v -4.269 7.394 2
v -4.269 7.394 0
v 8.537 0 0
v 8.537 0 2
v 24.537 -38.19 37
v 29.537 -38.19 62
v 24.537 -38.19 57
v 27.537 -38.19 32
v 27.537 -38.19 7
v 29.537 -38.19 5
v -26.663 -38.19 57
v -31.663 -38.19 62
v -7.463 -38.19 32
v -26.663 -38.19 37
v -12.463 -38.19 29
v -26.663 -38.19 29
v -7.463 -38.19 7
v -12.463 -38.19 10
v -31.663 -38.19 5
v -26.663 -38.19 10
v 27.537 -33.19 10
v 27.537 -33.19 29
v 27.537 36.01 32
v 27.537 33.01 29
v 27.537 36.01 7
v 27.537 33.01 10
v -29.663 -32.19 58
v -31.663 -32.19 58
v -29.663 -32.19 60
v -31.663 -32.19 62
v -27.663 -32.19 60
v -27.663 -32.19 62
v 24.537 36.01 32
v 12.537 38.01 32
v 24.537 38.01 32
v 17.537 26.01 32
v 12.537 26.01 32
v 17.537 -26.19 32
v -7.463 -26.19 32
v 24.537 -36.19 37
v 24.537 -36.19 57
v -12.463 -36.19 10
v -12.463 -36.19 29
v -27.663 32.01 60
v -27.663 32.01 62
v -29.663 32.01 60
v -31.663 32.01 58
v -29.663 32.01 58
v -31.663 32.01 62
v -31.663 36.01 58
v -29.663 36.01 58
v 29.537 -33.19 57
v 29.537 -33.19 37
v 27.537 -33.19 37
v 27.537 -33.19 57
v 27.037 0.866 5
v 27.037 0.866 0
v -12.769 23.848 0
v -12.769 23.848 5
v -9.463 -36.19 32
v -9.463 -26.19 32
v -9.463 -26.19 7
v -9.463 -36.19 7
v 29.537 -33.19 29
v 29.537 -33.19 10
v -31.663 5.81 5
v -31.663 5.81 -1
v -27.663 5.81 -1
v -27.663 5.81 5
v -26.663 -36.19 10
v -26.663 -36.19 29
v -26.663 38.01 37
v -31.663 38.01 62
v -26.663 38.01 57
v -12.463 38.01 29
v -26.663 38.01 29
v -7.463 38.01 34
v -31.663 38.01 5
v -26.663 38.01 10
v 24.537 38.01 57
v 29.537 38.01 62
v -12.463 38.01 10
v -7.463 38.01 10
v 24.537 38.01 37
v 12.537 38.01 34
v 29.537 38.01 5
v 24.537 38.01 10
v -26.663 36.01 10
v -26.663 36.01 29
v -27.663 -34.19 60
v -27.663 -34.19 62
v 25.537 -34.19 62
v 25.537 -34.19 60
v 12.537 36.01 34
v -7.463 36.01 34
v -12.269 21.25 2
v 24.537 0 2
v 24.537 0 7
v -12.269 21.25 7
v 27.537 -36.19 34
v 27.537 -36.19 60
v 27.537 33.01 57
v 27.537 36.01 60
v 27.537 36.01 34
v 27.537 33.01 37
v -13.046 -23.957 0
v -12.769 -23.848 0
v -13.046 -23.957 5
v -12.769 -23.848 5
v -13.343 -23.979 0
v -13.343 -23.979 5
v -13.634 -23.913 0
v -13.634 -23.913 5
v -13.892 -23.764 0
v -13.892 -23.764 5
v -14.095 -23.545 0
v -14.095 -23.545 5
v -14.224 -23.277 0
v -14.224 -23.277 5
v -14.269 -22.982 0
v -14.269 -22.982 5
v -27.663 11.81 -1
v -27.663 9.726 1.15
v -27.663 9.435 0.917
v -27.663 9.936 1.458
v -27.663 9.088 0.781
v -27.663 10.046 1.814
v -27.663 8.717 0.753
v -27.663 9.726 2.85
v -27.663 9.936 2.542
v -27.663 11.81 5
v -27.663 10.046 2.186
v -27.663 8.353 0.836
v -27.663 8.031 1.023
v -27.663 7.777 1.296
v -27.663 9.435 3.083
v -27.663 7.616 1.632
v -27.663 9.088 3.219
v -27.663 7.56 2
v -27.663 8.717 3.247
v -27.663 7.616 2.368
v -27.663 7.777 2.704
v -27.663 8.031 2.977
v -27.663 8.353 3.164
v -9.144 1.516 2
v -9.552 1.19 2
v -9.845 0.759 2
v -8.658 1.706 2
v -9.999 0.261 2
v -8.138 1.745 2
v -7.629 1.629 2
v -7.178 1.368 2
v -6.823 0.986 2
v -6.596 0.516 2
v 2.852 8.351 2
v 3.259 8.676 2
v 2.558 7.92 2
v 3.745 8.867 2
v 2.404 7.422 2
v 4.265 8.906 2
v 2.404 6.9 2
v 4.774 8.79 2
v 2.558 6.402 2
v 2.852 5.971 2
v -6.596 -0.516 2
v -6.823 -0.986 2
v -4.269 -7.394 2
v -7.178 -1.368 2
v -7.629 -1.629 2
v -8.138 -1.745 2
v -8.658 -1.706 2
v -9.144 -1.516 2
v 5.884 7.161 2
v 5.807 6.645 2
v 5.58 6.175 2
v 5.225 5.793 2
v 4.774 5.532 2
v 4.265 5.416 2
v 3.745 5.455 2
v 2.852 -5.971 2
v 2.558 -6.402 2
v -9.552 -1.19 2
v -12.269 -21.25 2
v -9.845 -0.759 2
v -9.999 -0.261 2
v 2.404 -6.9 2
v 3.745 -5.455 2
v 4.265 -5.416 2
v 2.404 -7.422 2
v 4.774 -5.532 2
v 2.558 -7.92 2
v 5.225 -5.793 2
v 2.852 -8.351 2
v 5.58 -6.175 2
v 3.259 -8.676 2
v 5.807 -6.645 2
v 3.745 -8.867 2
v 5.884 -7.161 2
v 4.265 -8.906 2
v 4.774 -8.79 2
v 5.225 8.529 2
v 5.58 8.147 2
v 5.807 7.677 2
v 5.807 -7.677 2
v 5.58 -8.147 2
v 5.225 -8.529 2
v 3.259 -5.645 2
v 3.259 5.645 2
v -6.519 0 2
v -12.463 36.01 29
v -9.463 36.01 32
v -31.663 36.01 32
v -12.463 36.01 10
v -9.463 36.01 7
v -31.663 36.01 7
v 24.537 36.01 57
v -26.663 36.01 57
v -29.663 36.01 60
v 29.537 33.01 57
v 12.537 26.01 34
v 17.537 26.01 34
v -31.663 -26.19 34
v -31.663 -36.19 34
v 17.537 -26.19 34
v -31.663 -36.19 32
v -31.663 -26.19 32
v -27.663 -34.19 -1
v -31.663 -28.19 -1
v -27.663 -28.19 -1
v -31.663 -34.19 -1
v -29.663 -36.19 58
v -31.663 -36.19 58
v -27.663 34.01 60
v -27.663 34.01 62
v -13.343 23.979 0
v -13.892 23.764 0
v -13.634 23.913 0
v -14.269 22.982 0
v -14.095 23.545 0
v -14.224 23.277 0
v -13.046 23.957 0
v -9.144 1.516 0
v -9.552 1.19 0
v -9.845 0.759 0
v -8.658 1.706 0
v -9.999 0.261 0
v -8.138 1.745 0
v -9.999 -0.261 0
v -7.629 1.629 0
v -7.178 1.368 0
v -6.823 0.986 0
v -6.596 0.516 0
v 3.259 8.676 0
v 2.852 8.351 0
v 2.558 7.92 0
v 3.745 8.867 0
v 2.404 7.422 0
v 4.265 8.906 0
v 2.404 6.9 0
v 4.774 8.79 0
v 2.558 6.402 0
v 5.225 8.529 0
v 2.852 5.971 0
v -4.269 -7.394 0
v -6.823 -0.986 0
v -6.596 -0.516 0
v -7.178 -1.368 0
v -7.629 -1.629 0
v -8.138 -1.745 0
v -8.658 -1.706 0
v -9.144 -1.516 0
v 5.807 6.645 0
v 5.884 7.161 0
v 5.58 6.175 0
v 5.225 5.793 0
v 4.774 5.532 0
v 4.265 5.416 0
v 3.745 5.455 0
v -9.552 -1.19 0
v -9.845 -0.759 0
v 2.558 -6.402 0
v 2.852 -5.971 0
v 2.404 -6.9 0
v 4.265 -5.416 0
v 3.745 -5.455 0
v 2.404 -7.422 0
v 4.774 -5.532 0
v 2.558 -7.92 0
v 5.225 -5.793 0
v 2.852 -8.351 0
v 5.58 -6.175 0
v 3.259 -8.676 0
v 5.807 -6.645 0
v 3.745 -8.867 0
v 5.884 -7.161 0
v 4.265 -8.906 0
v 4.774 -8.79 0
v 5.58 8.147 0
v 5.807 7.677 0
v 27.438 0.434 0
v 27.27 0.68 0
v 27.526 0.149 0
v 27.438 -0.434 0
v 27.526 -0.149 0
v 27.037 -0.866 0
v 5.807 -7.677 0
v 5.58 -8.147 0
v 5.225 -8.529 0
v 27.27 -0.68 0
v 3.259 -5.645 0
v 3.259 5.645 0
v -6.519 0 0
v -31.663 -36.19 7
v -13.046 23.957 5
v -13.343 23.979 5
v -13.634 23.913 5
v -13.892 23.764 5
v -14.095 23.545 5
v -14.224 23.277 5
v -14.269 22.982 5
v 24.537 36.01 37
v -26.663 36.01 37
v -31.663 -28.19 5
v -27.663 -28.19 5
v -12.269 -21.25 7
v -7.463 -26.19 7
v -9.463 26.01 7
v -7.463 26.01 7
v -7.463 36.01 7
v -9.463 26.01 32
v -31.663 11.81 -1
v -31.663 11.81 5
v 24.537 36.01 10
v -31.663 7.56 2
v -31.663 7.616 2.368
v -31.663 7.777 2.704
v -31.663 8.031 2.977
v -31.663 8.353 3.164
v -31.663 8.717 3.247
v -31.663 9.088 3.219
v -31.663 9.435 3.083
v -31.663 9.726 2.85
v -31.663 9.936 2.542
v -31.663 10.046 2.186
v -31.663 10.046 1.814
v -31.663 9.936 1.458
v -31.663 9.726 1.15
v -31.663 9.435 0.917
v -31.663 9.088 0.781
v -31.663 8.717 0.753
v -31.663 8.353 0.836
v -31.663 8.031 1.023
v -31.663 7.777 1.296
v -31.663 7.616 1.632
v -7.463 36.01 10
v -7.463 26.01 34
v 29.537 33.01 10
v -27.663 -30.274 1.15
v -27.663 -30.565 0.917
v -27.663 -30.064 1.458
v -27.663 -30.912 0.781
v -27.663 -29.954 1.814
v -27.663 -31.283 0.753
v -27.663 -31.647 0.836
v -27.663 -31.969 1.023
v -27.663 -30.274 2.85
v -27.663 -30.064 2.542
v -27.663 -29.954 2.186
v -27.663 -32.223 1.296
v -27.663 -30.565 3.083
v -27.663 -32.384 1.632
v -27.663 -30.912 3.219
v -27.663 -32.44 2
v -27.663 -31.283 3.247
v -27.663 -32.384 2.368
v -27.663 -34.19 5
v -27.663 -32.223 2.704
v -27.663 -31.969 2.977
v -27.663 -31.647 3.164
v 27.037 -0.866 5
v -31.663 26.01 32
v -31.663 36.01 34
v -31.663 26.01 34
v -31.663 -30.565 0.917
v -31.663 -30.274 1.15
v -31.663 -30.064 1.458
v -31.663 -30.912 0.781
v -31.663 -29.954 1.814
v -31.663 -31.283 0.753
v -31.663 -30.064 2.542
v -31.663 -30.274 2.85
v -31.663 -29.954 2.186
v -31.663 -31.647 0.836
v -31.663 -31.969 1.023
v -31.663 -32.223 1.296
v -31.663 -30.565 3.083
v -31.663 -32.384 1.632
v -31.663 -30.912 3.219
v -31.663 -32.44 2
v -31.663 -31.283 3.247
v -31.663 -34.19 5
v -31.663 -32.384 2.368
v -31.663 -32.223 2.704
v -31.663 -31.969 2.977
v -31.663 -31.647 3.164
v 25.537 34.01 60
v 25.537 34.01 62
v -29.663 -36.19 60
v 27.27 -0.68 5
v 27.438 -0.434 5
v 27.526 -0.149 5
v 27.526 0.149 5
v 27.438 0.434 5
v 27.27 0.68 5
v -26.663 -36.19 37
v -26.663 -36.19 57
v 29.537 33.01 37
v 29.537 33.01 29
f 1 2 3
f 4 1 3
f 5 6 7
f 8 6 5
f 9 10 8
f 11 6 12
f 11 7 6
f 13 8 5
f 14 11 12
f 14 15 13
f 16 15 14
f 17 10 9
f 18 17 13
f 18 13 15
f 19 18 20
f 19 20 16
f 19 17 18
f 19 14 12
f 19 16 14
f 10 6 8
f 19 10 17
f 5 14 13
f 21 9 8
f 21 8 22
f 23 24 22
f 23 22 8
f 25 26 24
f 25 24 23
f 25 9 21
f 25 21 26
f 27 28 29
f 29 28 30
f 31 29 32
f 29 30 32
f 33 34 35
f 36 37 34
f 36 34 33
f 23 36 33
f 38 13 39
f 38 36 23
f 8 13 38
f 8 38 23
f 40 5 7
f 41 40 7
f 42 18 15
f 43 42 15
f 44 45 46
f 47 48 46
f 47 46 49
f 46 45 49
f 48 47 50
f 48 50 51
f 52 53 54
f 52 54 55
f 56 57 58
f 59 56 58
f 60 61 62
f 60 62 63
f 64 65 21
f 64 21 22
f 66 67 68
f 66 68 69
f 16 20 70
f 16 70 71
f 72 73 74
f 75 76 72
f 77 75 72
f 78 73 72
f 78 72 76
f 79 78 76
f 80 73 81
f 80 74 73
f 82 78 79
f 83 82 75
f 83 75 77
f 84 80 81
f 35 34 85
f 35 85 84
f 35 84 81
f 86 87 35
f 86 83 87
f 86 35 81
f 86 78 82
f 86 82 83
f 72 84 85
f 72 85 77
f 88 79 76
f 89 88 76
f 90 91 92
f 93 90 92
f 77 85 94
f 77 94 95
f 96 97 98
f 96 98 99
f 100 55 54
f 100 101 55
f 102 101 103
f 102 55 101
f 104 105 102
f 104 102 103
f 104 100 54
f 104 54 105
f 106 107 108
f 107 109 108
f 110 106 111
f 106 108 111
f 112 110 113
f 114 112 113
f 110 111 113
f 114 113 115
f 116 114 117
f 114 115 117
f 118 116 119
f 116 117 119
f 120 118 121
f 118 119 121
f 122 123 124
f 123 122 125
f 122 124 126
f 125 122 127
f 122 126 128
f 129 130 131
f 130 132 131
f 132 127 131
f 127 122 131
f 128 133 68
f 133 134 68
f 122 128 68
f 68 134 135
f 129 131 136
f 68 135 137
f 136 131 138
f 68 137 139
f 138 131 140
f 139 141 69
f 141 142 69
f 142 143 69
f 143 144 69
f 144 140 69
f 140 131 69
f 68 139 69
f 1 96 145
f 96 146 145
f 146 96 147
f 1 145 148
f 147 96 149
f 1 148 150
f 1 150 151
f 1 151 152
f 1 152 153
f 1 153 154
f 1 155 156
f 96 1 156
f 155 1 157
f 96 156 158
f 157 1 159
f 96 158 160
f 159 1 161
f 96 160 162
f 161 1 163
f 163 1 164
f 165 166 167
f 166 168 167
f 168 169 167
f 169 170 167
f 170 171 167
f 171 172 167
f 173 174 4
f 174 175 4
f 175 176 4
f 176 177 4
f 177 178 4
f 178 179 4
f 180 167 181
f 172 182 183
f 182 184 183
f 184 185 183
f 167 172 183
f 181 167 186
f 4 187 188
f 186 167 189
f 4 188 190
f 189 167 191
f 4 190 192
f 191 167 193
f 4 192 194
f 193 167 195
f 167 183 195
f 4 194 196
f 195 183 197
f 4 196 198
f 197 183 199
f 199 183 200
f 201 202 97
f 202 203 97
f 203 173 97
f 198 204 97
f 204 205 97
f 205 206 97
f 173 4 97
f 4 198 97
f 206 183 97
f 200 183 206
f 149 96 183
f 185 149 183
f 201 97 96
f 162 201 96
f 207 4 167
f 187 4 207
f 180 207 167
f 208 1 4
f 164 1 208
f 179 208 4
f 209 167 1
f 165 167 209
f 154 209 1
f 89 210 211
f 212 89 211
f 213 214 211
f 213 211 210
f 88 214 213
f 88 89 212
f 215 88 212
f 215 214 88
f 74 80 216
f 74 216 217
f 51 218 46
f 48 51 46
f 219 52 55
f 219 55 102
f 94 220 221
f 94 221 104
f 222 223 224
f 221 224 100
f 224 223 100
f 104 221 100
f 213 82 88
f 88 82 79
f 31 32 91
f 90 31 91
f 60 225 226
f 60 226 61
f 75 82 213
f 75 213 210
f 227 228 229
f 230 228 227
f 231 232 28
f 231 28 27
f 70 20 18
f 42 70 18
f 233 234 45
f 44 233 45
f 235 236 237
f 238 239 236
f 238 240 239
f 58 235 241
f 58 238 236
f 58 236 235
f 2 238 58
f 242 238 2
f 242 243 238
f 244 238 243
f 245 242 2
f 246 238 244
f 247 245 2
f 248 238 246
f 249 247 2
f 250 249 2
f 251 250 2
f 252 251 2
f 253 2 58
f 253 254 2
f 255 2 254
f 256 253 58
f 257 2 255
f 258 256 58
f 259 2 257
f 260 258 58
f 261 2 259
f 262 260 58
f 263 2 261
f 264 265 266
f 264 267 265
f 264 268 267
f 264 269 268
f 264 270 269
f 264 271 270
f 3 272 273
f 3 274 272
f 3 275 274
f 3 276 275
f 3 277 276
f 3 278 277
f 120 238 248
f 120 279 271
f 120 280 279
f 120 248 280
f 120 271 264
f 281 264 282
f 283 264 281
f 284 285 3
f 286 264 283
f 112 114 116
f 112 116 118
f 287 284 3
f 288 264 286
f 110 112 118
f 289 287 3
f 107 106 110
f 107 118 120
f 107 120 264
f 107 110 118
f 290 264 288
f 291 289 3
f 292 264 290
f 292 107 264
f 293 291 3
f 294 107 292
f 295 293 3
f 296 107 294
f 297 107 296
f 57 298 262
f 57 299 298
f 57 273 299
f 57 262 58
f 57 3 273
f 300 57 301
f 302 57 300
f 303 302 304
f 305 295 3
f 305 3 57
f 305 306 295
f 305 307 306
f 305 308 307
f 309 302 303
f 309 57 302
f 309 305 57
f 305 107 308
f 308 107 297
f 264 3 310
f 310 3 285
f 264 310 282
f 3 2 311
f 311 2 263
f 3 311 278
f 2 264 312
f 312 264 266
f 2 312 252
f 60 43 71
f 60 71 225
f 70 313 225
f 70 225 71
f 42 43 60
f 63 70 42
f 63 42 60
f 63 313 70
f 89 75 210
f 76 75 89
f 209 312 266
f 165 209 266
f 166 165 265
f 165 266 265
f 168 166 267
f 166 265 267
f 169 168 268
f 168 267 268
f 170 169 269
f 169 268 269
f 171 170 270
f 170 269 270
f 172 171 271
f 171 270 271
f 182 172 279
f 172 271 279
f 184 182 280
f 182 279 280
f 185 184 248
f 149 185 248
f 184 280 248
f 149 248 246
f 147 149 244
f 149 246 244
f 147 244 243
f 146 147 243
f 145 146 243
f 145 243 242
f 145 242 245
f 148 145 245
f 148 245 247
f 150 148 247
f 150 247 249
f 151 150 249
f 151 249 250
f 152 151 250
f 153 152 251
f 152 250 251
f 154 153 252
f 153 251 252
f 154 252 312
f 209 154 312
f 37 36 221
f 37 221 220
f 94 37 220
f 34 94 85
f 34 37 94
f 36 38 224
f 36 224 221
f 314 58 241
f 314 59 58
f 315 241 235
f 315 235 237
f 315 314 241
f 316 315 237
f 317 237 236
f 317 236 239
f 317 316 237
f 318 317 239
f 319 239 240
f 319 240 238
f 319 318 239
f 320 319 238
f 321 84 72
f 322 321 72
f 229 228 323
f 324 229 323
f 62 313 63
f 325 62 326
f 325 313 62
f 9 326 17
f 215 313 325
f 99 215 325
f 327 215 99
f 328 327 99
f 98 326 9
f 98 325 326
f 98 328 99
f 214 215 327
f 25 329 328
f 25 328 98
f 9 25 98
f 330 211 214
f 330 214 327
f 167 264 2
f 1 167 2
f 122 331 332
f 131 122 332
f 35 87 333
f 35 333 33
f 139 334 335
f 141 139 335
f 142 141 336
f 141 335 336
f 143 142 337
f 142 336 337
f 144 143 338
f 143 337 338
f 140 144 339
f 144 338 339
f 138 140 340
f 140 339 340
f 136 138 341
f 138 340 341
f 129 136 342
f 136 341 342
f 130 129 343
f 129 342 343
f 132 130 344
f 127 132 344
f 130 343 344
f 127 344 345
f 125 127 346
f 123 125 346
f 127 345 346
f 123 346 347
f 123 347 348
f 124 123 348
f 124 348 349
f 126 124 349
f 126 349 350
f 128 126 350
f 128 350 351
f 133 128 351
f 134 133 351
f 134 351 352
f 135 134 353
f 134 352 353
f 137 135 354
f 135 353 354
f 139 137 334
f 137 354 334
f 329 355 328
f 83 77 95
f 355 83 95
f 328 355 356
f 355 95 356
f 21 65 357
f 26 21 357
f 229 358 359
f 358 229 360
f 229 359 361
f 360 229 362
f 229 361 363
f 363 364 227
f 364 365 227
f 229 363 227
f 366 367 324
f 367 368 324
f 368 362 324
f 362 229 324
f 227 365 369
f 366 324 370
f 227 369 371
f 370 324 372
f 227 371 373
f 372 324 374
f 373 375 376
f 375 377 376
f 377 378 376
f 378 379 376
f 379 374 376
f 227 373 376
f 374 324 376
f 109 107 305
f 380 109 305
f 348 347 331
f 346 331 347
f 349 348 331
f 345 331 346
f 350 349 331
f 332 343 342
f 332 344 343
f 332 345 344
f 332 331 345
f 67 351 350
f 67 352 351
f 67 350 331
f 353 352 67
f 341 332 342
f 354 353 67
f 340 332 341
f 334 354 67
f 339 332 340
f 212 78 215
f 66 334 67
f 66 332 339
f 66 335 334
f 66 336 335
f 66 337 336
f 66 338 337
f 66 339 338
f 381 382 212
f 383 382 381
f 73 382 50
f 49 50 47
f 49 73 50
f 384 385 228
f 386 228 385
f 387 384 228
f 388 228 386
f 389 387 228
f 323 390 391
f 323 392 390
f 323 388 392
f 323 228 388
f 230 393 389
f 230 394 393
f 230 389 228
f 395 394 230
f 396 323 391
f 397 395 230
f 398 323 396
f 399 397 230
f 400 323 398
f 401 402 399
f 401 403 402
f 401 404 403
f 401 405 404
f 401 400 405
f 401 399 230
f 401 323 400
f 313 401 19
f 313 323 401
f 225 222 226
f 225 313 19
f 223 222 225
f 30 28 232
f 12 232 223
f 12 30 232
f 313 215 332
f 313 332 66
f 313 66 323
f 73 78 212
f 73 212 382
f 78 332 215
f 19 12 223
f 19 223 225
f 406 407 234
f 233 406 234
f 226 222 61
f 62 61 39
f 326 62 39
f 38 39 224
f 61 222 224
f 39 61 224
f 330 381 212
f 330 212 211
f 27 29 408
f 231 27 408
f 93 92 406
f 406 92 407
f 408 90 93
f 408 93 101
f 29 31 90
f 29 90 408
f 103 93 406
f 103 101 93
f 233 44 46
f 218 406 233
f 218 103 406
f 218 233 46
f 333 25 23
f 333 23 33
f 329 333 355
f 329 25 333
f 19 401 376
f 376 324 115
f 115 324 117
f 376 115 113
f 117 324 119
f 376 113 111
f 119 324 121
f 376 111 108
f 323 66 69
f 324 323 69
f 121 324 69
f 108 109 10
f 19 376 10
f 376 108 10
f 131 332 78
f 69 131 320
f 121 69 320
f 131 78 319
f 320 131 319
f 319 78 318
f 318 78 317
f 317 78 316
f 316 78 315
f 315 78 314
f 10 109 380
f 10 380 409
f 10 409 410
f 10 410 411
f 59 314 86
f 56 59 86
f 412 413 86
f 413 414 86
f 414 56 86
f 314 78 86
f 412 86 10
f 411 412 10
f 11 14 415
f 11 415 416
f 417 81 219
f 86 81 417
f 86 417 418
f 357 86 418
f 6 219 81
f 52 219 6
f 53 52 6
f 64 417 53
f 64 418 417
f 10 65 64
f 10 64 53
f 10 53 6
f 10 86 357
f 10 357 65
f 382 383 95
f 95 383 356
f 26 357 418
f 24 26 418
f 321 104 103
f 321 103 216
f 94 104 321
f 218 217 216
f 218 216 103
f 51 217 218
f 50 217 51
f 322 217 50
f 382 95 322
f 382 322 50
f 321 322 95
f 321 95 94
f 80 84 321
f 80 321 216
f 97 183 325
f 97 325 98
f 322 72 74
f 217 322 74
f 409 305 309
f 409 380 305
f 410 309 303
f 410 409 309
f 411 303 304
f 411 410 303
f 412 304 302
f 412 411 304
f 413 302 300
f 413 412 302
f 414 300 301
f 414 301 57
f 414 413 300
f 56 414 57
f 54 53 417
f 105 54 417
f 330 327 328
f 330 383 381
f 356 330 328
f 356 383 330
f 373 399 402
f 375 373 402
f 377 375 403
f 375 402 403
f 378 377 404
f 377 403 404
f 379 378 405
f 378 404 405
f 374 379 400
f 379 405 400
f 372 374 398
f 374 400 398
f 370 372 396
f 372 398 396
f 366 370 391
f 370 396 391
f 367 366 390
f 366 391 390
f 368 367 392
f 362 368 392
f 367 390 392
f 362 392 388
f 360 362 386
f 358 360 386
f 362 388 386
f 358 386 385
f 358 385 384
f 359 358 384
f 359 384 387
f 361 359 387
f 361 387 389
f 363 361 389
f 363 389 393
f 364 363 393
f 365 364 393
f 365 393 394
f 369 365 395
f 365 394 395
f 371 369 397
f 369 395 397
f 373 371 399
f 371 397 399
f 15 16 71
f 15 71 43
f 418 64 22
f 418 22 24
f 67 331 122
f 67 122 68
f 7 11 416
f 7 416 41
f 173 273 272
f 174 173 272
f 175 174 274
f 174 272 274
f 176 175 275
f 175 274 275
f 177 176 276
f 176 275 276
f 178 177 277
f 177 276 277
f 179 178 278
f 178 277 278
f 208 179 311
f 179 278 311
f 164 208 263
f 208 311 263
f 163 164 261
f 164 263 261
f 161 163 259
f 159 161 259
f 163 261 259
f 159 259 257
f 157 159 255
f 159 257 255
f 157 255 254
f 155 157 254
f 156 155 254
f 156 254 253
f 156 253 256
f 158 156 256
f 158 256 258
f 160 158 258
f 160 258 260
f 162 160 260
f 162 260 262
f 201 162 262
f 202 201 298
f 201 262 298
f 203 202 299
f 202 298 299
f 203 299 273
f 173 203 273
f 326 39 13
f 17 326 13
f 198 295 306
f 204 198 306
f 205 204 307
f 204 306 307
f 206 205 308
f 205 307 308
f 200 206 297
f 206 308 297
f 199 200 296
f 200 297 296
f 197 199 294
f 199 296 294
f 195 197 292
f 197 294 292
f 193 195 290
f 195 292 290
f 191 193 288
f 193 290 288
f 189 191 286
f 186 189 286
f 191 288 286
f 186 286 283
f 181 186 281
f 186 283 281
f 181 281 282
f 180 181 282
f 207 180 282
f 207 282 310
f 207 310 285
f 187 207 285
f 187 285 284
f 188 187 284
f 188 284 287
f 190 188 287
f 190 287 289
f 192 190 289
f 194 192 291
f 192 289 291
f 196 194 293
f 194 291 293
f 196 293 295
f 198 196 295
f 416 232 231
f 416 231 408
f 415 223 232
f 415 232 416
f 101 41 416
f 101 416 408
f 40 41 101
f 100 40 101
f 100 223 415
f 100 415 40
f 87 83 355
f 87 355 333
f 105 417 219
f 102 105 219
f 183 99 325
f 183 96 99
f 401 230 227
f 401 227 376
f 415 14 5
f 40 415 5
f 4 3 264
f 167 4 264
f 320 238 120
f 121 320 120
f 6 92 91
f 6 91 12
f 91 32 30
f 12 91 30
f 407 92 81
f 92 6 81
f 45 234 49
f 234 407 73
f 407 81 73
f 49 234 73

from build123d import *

# Parameters (mm, degrees)
PAD_DEPTH       = 5
FILLET_R        = 1
FILLET001_R     = 1
FILLET002_R     = 1
SKETCH001_R     = 1.75
PAD001_DEPTH    = 2
SKETCH002_W     = 61.2
SKETCH002_H     = 76.2
PAD002_DEPTH    = 2
PAD003_DEPTH    = 55
SKETCH004_W     = 35
SKETCH004_H     = 25
SKETCH004_W_2   = 14.2
SKETCH004_H_2   = 19
SKETCH004_W_3   = 51.2
SKETCH004_H_3   = 20
POCKET_DEPTH    = 2
SKETCH005_W     = 14.2
SKETCH005_H     = 19
SKETCH005_W_2   = 51.2
SKETCH005_H_2   = 20
POCKET001_DEPTH = 2
SKETCH006_W     = 66.2
SKETCH006_H     = 19
SKETCH006_H_2   = 20
POCKET002_DEPTH = 2
SKETCH007_W     = 24.2
SKETCH007_H     = 10
PAD004_DEPTH    = 2
SKETCH008_W     = 2
SKETCH008_H     = 10
PAD005_DEPTH    = 25
PAD006_DEPTH    = 2
SKETCH010_W     = 2
SKETCH010_H     = 4
PAD007_DEPTH    = 2
SKETCH011_W     = 6
SKETCH011_H     = 6
SKETCH011_R     = 1.25
PAD008_DEPTH    = 4


with BuildPart() as part:
    # Sketch → Pad (new body)
    with BuildSketch(Plane.XY):
        Polygon((28.537386, 0), (-14.268693, 24.714102), (-14.268693, -24.714102), align=None)
        Polygon((24.537386, 0), (-12.268693, 21.25), (-12.268693, -21.25), align=None, mode=Mode.SUBTRACT)
    extrude(amount=PAD_DEPTH)

    # Fillet
    fillet_edges = [part.edges().sort_by_distance(p)[0] for p in [
        (-14.268693, -24.714102, 2.5),
    ]]
    fillet(fillet_edges, radius=FILLET_R)

    # Fillet001
    fillet001_edges = [part.edges().sort_by_distance(p)[0] for p in [
        (28.537386, 0, 2.5),
    ]]
    fillet(fillet001_edges, radius=FILLET001_R)

    # Fillet002
    fillet002_edges = [part.edges().sort_by_distance(p)[0] for p in [
        (-14.268693, 24.714102, 2.5),
    ]]
    fillet(fillet002_edges, radius=FILLET002_R)

    # Sketch001 (on Face1 of Fillet002) → Pad001 (join)
    with BuildSketch(Plane(origin=(0, 0, 0), x_dir=(1, 0, 0), z_dir=(0, 0, -1))):
        Polygon((24.537386, 0), (-12.268693, 21.25), (-12.268693, -21.25), align=None)
        with Locations((4.134347, 7.160898)):
            Circle(SKETCH001_R, mode=Mode.SUBTRACT)
        with Locations((4.134347, -7.160898)):
            Circle(SKETCH001_R, mode=Mode.SUBTRACT)
        with Locations((-8.268693, 0)):
            Circle(SKETCH001_R, mode=Mode.SUBTRACT)
        Polygon((8.537386, 0), (-4.268693, 7.393594), (-4.268693, -7.393594), align=None, mode=Mode.SUBTRACT)
    extrude(amount=-PAD001_DEPTH)

    # Sketch002 (on Face9 of Pad001) → Pad002 (join)
    with BuildSketch(Plane.XY.offset(5)):
        with Locations((-1.062614, -0.09)):
            Rectangle(SKETCH002_W, SKETCH002_H)
        Polygon((-12.268693, 21.25), (-12.268693, -21.25), (24.537386, 0), align=None, mode=Mode.SUBTRACT)
    extrude(amount=PAD002_DEPTH)

    # Sketch003 (on Face21 of Pad002) → Pad003 (join)
    with BuildSketch(Plane.XY.offset(7)):
        Polygon((-31.662614, 38.01), (29.537386, 38.01), (29.537386, -38.19), (-31.662614, -38.19), (-31.662614, -36.19), (27.537386, -36.19), (27.537386, 36.01), (-31.662614, 36.01), align=None)
    extrude(amount=PAD003_DEPTH)

    # Sketch004 (on Face26 of Pad003) → Pocket (cut)
    with BuildSketch(Plane.XZ.offset(38.19)):
        with Locations((10.037386, 19.5)):
            Rectangle(SKETCH004_W, SKETCH004_H)
        with Locations((-19.562614, 19.5)):
            Rectangle(SKETCH004_W_2, SKETCH004_H_2)
        with Locations((-1.062614, 47)):
            Rectangle(SKETCH004_W_3, SKETCH004_H_3)
    extrude(amount=-POCKET_DEPTH, mode=Mode.SUBTRACT)

    # Sketch005 (on Face21 of Pocket) → Pocket001 (cut)
    with BuildSketch(Plane(origin=(0, 38.01, 0), x_dir=(-1, 0, 0), z_dir=(0, 1, 0))):
        Polygon((-24.537386, 32), (-12.537386, 32), (-12.537386, 34), (7.462614, 34), (7.462614, 32), (7.462614, 10), (-24.537386, 10), align=None)
        with Locations((19.562614, 19.5)):
            Rectangle(SKETCH005_W, SKETCH005_H)
        with Locations((1.062614, 47)):
            Rectangle(SKETCH005_W_2, SKETCH005_H_2)
    extrude(amount=-POCKET001_DEPTH, mode=Mode.SUBTRACT)

    # Sketch006 (on Face25 of Pocket001) → Pocket002 (cut)
    with BuildSketch(Plane.YZ.offset(29.537386)):
        with Locations((-0.09, 19.5)):
            Rectangle(SKETCH006_W, SKETCH006_H)
        with Locations((-0.09, 47)):
            Rectangle(SKETCH006_W, SKETCH006_H_2)
    extrude(amount=-POCKET002_DEPTH, mode=Mode.SUBTRACT)

    # Sketch007 (on Face62 of Pocket002) → Pad004 (join)
    with BuildSketch(Plane(origin=(0, 0, 32), x_dir=(1, 0, 0), z_dir=(0, 0, -1))):
        Polygon((-31.662614, 36.19), (-31.662614, 26.19), (17.537386, 26.19), (17.537386, -26.01), (12.537386, -26.01), (12.537386, -36.01), (27.537386, -36.01), (27.537386, 36.19), align=None)
        with Locations((-19.562614, -31.01)):
            Rectangle(SKETCH007_W, SKETCH007_H)
    extrude(amount=-PAD004_DEPTH)

    # Sketch008 (on Face79 of Pad004) → Pad005 (join)
    with BuildSketch(Plane(origin=(0, 0, 32), x_dir=(1, 0, 0), z_dir=(0, 0, -1))):
        with Locations((-8.462614, 31.19)):
            Rectangle(SKETCH008_W, SKETCH008_H)
        with Locations((-8.462614, -31.01)):
            Rectangle(SKETCH008_W, SKETCH008_H)
    extrude(amount=PAD005_DEPTH)

    # Sketch009 (on Face31 of Pad005) → Pad006 (join)
    with BuildSketch(Plane.XY.offset(62)):
        Polygon((-31.662614, 36.01), (27.537386, 36.01), (27.537386, -36.19), (-31.662614, -36.19), (-31.662614, -32.19), (-27.662614, -32.19), (-27.662614, -34.19), (25.537386, -34.19), (25.537386, 34.01), (-27.662614, 34.01), (-27.662614, 32.01), (-31.662614, 32.01), align=None)
    extrude(amount=-PAD006_DEPTH)

    # Sketch010 (on Face92 of Pad006) → Pad007 (join)
    with BuildSketch(Plane(origin=(0, 0, 60), x_dir=(1, 0, 0), z_dir=(0, 0, -1))):
        with Locations((-30.662614, 34.19)):
            Rectangle(SKETCH010_W, SKETCH010_H)
        with Locations((-30.662614, -34.01)):
            Rectangle(SKETCH010_W, SKETCH010_H)
    extrude(amount=PAD007_DEPTH)

    # Sketch011 (on Face17 of Pad007) → Pad008 (join)
    with BuildSketch(Plane(origin=(-31.662614, 0, 0), x_dir=(0, -1, 0), z_dir=(-1, 0, 0))):
        with Locations((-8.81, 2)):
            Rectangle(SKETCH011_W, SKETCH011_H)
        with Locations((-8.81, 2)):
            Circle(SKETCH011_R, mode=Mode.SUBTRACT)
        with Locations((31.19, 2)):
            Rectangle(SKETCH011_W, SKETCH011_H)
        with Locations((31.19, 2)):
            Circle(SKETCH011_R, mode=Mode.SUBTRACT)
    extrude(amount=-PAD008_DEPTH)


solid = part.part
